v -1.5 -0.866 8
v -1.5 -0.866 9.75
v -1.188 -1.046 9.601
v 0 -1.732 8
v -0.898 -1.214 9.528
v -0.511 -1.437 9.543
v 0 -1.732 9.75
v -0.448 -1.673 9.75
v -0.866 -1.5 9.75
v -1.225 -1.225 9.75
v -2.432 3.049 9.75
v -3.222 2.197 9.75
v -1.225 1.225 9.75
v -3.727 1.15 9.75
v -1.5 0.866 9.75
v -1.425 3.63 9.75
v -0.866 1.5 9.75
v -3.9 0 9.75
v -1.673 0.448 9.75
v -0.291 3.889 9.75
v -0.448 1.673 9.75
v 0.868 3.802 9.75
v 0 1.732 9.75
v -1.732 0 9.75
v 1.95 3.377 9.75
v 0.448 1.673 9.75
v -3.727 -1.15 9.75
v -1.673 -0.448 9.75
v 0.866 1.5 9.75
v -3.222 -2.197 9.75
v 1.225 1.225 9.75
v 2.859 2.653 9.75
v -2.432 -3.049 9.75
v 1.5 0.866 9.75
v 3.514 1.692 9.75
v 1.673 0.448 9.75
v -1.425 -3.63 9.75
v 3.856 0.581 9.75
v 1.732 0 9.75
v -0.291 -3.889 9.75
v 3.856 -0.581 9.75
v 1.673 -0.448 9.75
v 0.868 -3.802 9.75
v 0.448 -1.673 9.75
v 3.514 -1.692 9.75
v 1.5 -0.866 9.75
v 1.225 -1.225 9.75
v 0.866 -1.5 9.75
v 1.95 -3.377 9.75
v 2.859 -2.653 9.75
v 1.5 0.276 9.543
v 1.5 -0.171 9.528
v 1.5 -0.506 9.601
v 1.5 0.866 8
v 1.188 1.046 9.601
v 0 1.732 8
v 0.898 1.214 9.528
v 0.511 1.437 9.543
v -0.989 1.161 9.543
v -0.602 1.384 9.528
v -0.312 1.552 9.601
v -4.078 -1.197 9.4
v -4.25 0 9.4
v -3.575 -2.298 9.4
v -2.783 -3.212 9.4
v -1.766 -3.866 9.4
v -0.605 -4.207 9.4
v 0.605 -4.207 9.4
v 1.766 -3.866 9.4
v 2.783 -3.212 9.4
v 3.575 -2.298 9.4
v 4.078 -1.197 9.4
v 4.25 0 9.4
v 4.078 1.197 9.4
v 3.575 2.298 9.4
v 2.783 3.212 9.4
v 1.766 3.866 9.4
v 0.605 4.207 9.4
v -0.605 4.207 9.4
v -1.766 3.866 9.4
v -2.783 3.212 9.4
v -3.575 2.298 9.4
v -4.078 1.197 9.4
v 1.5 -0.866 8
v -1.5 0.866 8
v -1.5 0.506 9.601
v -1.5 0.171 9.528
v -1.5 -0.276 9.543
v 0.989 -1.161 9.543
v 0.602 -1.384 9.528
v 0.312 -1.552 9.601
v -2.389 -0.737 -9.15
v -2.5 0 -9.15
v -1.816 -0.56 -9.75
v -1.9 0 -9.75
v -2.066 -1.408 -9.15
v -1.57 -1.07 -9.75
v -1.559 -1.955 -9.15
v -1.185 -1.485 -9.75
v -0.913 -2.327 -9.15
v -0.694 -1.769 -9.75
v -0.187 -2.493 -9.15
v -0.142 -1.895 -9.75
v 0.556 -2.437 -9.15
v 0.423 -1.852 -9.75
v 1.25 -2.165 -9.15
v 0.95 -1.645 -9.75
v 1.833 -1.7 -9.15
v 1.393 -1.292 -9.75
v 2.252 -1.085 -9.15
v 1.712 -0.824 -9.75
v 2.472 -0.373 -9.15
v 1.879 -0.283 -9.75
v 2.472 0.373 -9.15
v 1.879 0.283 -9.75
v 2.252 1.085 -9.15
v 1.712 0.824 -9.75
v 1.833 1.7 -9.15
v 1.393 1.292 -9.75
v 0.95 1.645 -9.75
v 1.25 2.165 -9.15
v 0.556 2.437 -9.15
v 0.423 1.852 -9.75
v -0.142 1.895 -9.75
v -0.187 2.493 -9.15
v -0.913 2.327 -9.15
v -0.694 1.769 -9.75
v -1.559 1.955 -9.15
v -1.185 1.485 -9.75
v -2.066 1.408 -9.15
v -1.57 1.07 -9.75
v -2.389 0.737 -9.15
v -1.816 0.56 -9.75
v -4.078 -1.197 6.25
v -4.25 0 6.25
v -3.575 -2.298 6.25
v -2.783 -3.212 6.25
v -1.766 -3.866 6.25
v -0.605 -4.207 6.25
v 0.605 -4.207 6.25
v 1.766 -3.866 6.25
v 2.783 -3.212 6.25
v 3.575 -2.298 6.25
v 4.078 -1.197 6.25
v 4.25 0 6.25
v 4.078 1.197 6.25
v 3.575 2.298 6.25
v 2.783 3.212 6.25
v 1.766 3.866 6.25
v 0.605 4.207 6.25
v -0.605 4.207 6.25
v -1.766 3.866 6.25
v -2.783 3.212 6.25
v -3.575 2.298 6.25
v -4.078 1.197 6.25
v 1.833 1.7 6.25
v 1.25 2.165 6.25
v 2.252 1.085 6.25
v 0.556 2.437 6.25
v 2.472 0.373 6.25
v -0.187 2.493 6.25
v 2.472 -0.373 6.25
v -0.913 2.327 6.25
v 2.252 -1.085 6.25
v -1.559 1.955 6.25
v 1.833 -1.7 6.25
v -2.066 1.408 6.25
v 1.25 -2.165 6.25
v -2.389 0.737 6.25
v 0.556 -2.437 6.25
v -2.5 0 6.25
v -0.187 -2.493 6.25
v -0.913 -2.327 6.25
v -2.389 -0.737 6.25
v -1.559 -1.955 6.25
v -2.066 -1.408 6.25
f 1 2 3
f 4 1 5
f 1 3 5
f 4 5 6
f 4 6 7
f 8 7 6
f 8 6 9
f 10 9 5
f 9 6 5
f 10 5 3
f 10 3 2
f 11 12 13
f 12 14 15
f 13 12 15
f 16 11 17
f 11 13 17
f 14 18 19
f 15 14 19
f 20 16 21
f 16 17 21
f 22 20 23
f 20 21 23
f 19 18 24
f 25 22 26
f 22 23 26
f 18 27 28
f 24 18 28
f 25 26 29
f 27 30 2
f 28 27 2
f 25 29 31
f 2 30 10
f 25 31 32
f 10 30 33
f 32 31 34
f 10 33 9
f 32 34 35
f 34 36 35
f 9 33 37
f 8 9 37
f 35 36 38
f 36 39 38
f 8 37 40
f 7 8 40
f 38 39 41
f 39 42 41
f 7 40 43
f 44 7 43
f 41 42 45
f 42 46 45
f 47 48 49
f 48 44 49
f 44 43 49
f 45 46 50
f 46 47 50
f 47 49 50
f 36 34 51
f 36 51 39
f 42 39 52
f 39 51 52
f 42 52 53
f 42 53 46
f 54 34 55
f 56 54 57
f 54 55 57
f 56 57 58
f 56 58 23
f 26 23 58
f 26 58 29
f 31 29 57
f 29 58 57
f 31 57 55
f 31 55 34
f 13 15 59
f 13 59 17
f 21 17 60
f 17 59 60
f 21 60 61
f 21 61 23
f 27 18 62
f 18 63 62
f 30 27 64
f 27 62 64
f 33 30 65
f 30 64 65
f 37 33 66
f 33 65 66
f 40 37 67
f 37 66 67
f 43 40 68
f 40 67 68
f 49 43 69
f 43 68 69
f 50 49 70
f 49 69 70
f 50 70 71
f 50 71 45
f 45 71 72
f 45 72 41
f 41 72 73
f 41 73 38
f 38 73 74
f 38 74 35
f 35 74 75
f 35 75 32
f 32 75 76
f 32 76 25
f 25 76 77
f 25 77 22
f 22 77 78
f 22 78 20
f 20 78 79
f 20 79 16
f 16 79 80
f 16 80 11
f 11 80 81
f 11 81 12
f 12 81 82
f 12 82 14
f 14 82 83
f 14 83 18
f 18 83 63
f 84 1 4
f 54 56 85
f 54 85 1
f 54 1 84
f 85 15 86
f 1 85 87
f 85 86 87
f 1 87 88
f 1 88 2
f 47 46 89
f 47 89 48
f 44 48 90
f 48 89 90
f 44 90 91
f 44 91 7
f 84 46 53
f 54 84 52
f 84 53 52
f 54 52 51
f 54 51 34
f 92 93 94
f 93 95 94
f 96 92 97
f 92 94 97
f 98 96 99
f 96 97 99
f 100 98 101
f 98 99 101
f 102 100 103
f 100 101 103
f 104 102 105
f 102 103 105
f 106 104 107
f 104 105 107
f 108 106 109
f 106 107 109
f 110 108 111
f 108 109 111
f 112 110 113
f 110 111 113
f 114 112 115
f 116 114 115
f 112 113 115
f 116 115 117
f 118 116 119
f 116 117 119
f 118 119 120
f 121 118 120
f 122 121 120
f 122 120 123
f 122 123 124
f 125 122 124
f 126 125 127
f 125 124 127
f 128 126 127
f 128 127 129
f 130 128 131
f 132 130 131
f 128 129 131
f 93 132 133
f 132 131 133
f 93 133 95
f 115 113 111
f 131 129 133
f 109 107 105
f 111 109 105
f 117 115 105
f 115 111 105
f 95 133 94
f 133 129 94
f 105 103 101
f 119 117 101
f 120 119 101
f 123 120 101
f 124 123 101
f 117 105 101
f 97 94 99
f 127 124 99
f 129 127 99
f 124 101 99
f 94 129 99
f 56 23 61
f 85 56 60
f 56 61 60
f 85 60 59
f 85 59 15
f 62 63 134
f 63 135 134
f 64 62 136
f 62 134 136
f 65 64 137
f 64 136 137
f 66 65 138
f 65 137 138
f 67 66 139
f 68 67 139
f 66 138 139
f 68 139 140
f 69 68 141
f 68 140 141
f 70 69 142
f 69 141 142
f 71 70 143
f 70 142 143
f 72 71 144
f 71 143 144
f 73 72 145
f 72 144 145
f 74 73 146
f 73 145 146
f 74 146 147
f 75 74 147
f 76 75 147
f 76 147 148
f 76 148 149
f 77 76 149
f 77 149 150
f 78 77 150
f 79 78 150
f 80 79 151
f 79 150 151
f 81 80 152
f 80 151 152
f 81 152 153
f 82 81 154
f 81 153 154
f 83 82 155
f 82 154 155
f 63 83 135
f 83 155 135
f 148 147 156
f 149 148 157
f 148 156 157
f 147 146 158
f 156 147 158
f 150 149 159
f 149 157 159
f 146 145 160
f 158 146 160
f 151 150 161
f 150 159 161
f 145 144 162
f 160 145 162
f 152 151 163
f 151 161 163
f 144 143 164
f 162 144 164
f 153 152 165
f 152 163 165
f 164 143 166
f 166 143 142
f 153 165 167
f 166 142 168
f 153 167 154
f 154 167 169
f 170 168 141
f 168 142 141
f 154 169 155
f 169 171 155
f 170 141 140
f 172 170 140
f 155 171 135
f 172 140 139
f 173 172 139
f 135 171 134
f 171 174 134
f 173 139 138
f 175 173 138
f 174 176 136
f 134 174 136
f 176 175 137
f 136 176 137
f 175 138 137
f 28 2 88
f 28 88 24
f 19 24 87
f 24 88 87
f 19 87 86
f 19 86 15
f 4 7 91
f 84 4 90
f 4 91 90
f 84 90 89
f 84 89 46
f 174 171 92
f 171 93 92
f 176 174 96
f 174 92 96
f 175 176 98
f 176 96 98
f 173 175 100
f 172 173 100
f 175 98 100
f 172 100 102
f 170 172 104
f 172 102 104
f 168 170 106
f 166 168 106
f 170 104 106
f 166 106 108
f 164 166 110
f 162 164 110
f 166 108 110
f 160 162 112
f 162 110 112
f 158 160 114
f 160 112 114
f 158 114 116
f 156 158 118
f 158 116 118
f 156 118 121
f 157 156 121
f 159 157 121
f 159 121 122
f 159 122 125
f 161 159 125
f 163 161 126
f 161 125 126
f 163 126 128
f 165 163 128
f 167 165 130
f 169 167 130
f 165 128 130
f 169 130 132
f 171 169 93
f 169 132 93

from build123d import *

# Parameters (mm, degrees)
CUT_EXTRUDE1_DEPTH = 1.75


with BuildPart() as part:
    # Sketch2 → Revolve1 (revolve)
    with BuildSketch(Plane(origin=(0, 0, 0), x_dir=(0, 0, -1), z_dir=(1, 0, 0)), mode=Mode.PRIVATE) as revolve1_sk:
        Polygon((-9.75, 0), (-9.75, 3.9), (-9.4, 4.25), (-6.25, 4.25), (-6.25, 2.5), (9.15, 2.5), (9.75, 1.9), (9.75, 0), align=None)
    revolve(revolve1_sk.sketch.rotate(Axis((0, 0, -9.75), (0, 0, 1)), 90), axis=Axis((0, 0, -9.75), (0, 0, 1)))

    # Sketch4 → Cut-Extrude1 (cut)
    with BuildSketch(Plane.XY.offset(9.75)):
        Polygon((1.5, -0.866025404), (1.5, 0.866025404), (0, 1.732050808), (-1.5, 0.866025404), (-1.5, -0.866025404), (0, -1.732050808), align=None)
    extrude(amount=-CUT_EXTRUDE1_DEPTH, mode=Mode.SUBTRACT)

    # Cut-Extrude2 cone 1 section (through the dimple's axis) → Cut-Extrude2 (revolve, cut)
    with BuildSketch(Plane(origin=(0, 0, 9.75), x_dir=(0, -1, 0), z_dir=(1, 0, 0))):
        Polygon((0, 0), (1.732050808, 0), (0, 1.732050808), align=None)
    revolve(axis=Axis((0, 0, 9.75), (0, 0, -1)), mode=Mode.SUBTRACT)


solid = part.part
